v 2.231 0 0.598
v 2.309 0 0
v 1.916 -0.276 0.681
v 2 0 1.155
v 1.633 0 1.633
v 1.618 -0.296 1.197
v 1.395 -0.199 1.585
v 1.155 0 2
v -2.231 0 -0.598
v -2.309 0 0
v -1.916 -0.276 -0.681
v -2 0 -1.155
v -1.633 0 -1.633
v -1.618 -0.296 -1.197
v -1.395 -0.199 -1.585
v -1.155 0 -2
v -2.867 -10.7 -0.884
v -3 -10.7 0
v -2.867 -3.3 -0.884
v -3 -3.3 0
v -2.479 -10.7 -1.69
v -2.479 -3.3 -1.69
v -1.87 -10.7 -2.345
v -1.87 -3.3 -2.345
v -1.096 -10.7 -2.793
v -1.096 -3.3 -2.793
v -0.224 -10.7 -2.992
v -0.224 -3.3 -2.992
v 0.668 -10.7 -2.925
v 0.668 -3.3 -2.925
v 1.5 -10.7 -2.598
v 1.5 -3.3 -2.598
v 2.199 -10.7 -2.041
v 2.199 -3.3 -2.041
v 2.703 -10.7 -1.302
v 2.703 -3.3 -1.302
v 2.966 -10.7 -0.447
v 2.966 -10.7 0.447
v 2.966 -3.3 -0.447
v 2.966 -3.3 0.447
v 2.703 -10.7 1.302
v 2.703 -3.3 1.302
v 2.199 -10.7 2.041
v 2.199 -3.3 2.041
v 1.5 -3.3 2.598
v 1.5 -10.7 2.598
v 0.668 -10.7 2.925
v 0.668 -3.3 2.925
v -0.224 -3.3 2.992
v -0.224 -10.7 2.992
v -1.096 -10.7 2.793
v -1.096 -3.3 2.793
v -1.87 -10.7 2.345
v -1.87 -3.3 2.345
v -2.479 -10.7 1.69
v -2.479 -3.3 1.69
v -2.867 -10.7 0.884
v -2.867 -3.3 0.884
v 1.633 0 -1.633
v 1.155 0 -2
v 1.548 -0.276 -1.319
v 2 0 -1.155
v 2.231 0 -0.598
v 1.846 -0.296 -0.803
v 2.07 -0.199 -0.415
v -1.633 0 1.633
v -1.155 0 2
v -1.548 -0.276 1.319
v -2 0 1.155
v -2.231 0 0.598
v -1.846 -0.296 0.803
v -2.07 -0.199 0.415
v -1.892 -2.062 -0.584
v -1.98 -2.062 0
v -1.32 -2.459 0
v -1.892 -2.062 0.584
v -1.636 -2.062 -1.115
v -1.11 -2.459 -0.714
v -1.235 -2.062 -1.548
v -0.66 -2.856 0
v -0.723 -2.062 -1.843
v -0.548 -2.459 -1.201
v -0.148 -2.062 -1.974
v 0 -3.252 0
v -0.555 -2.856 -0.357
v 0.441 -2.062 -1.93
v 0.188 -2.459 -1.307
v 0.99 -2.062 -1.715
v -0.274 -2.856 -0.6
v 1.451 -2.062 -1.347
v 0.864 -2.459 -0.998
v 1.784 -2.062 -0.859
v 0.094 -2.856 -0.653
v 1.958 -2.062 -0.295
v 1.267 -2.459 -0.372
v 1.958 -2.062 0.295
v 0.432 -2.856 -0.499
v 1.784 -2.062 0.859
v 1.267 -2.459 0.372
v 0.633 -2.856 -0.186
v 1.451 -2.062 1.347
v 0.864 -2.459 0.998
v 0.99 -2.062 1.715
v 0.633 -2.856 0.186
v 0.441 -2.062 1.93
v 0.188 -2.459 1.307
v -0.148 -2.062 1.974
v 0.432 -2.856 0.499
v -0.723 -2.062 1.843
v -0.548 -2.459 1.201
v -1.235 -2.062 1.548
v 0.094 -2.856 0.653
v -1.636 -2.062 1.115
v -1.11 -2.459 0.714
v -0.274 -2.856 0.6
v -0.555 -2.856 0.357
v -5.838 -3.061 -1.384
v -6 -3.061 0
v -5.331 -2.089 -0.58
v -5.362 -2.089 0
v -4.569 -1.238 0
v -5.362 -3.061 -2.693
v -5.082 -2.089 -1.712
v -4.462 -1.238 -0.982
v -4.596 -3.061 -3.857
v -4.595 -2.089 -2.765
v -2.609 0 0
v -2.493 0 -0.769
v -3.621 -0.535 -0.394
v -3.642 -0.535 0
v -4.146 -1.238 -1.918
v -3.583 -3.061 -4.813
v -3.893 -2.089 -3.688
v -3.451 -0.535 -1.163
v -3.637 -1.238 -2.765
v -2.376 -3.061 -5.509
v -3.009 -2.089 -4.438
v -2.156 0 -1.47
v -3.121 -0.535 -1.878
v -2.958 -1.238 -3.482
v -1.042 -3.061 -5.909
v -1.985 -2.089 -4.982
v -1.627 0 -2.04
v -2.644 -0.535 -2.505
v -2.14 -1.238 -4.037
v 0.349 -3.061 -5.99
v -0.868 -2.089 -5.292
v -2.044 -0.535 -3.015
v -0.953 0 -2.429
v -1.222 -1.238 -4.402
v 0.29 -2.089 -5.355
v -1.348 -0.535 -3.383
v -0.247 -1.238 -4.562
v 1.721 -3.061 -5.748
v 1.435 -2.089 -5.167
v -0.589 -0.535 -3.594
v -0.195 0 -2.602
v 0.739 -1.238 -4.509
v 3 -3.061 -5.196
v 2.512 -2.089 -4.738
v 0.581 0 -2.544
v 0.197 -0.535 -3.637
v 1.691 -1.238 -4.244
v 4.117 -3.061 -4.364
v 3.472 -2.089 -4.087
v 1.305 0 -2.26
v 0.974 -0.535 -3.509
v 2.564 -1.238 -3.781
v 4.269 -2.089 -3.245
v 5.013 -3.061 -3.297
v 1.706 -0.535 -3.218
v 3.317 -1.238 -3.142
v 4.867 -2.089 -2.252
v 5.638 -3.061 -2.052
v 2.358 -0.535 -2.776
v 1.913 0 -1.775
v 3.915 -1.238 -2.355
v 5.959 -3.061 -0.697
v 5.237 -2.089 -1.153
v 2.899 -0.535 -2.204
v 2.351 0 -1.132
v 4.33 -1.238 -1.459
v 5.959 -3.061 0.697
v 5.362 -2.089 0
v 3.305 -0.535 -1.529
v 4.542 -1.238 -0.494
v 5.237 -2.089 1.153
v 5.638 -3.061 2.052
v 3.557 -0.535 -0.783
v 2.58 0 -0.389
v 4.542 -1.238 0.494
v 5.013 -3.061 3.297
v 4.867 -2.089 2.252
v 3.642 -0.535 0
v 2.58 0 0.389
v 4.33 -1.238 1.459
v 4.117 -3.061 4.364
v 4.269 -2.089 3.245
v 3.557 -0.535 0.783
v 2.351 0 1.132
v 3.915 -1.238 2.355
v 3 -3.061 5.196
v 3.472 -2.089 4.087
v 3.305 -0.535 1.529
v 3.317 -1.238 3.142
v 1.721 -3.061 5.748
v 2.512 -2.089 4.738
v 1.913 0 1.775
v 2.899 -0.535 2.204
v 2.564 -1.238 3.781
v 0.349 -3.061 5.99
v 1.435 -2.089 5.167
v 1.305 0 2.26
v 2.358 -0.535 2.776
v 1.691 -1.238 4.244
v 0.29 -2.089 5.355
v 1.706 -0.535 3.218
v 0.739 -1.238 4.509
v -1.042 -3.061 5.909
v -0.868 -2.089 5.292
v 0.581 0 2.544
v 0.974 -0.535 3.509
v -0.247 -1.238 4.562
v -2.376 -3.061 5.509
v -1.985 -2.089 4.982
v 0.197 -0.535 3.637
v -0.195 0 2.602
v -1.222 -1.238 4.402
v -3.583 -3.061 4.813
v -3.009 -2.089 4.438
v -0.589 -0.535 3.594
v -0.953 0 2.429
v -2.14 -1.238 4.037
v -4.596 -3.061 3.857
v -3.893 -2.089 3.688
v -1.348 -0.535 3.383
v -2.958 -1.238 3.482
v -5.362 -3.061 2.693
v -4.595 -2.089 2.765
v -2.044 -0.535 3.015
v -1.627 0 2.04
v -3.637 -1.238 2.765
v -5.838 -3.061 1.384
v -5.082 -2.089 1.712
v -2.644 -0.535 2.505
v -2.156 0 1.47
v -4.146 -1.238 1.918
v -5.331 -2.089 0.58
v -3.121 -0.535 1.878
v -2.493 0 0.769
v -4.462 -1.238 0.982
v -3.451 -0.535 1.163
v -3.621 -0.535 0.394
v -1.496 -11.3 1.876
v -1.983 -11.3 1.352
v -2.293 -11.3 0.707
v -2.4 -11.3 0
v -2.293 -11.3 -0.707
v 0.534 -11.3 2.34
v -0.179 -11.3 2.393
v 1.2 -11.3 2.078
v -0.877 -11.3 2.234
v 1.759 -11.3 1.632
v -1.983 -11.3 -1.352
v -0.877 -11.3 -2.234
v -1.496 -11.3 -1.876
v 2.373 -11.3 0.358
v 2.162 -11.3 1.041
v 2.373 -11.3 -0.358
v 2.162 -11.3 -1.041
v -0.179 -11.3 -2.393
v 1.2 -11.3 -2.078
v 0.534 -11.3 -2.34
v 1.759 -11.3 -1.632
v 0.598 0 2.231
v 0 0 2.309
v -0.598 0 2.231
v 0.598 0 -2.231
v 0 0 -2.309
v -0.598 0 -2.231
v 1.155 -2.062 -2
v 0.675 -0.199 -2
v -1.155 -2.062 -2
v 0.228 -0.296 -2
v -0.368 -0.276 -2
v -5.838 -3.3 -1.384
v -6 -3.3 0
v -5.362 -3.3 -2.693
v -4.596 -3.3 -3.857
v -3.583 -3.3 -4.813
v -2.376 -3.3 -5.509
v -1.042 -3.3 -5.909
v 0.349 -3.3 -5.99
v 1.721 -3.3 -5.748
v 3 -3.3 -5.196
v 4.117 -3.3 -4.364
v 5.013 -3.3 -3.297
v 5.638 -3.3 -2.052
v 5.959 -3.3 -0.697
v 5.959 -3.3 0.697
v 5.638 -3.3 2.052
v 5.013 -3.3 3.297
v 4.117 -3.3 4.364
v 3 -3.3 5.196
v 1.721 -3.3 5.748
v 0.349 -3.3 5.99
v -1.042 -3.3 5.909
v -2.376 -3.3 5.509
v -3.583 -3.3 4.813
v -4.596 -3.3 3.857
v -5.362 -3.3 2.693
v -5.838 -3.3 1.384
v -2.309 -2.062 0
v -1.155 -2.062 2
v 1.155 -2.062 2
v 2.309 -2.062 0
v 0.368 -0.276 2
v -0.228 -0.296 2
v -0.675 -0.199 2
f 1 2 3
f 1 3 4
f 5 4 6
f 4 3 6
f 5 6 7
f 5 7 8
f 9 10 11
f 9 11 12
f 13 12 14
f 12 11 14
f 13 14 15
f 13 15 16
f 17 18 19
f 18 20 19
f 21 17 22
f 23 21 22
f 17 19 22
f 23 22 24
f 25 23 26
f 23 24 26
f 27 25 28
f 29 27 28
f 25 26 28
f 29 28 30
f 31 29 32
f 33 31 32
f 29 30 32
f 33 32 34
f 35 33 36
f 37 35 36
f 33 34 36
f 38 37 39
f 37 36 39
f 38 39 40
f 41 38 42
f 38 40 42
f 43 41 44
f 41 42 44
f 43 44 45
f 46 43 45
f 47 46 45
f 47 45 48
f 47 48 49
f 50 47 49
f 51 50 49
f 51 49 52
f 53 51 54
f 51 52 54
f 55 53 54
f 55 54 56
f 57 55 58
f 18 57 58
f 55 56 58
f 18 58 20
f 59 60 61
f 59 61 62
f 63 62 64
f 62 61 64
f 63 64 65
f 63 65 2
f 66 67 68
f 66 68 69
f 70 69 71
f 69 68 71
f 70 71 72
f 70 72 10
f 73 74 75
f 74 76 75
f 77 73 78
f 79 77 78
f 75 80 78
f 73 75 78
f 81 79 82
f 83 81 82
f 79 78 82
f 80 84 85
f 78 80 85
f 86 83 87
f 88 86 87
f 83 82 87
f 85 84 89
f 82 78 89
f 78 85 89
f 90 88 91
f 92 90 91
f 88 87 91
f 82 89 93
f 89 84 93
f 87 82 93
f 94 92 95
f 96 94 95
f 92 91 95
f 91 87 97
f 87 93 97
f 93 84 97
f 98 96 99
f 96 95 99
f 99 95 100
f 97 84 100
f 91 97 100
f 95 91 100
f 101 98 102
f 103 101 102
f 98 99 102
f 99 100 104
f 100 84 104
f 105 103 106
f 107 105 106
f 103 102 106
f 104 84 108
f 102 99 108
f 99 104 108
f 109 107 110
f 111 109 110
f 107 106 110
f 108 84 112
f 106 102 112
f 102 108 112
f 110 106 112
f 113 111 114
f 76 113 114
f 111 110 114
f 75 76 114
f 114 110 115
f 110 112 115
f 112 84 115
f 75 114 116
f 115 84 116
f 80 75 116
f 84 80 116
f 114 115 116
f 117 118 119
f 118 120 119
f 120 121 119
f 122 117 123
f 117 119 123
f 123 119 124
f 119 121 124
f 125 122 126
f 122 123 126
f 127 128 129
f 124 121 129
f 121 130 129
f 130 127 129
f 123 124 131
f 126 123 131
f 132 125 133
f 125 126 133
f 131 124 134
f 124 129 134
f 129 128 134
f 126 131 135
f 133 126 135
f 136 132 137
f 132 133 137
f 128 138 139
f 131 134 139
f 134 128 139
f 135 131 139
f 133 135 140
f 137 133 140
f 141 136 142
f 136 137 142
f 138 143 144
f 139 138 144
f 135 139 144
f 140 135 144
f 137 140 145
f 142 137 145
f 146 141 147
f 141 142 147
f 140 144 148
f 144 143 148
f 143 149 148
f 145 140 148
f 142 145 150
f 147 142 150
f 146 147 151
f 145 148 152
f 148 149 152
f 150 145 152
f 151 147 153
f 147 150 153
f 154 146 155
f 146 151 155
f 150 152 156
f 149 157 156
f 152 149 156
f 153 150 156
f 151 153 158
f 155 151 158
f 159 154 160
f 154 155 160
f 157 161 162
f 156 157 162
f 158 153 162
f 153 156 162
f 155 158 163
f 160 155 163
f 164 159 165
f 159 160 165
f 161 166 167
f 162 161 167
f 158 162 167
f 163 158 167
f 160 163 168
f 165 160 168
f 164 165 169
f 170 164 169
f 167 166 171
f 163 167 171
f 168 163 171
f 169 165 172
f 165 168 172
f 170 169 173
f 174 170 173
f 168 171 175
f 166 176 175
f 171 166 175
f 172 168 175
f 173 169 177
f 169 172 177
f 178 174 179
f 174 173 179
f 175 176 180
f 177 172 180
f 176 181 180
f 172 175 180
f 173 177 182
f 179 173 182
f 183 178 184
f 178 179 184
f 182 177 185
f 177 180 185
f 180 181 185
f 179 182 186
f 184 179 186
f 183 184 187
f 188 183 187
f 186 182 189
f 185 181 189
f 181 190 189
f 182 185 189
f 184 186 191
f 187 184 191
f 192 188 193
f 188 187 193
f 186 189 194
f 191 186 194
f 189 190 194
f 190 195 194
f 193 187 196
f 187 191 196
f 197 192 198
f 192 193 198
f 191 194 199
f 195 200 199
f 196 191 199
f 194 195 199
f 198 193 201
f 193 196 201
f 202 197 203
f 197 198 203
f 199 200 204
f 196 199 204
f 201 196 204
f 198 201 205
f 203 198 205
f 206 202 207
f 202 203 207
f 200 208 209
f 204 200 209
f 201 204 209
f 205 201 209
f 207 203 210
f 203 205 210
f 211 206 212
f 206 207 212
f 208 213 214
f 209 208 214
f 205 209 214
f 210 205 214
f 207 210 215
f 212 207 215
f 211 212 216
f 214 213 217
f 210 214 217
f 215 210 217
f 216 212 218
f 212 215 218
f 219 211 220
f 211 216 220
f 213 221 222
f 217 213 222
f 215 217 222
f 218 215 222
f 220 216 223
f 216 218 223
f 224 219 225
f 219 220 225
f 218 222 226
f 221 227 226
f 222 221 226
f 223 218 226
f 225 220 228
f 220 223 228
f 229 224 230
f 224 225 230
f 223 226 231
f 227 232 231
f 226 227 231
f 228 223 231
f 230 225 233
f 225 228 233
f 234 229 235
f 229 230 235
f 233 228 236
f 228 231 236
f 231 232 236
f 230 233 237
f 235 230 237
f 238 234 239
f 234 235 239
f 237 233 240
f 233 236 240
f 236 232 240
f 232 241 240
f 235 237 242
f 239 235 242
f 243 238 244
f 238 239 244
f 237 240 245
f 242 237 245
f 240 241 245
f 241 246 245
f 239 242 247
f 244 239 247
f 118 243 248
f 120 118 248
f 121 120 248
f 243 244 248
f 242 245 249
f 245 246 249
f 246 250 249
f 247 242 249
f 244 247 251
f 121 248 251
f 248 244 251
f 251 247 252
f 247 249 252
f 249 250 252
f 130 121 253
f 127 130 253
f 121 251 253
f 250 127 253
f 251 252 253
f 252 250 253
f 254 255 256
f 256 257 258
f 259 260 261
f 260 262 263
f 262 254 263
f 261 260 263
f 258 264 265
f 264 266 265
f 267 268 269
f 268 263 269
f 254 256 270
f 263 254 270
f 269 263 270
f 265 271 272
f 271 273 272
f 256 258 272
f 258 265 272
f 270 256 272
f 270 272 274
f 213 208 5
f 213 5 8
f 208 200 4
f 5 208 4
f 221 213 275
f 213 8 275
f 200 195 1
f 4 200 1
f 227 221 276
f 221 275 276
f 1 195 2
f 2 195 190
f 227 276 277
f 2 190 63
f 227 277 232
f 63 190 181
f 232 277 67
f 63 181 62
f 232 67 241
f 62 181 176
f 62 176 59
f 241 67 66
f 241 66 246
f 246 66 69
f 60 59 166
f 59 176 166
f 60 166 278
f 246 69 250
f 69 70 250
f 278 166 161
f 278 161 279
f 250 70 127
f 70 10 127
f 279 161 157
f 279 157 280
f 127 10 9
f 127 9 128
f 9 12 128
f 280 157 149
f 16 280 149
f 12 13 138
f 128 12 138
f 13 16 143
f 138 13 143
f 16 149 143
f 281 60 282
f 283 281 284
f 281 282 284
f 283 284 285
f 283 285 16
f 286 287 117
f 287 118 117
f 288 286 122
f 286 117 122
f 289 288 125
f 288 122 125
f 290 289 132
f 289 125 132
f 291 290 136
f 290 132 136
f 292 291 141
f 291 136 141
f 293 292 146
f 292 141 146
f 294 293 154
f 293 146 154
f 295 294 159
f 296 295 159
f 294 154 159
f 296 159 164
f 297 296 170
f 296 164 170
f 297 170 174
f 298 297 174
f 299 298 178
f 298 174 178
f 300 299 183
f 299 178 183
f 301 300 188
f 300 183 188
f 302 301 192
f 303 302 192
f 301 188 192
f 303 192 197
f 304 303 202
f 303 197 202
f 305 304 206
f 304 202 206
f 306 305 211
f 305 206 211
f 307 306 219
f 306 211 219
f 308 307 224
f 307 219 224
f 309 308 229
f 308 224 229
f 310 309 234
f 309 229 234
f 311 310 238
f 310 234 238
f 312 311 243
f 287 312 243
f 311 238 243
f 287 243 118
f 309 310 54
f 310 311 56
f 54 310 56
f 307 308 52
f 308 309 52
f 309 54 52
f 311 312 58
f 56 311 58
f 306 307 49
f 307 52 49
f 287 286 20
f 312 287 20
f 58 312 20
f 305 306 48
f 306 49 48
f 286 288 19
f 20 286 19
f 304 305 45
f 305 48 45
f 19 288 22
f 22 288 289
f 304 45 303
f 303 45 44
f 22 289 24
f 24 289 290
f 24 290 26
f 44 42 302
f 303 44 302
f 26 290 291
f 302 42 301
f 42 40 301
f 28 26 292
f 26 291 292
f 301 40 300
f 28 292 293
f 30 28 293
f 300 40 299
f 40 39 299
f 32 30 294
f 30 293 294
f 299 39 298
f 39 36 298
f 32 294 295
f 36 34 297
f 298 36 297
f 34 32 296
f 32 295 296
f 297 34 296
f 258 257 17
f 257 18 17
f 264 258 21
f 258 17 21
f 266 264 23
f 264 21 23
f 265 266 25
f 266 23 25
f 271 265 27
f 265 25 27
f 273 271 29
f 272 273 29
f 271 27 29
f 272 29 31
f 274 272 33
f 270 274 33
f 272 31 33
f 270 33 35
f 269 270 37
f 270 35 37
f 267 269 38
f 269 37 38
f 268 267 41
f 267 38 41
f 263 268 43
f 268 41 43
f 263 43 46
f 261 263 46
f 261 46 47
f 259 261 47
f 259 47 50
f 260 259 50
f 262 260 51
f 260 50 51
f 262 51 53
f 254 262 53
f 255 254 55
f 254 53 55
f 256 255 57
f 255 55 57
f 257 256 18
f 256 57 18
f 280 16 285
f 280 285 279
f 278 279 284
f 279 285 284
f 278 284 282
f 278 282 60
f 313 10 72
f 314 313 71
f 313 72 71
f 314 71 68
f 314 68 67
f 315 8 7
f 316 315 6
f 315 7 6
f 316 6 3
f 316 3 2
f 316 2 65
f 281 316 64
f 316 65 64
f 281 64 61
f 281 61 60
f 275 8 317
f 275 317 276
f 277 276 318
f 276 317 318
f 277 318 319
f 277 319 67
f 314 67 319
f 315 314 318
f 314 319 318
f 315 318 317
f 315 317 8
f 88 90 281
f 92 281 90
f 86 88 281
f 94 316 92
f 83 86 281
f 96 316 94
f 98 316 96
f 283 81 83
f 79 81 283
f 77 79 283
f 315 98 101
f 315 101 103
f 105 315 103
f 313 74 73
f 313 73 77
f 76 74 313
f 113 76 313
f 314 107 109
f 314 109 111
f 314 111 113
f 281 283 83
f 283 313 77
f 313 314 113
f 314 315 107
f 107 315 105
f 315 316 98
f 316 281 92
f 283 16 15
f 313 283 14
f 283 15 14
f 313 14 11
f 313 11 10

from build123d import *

# Parameters (mm, degrees)
SCHNITT_LINEAR_AUSTRAGEN1_DEPTH = 2.0625


with BuildPart() as part:
    # Skizze1 → Rotation1 (revolve)
    with BuildSketch(Plane(origin=(0, 0, 0), x_dir=(1, 0, 0), z_dir=(0, 0, -1)), mode=Mode.PRIVATE) as rotation1_sk:
        with BuildLine():
            Line((0, 11.3), (2.4, 11.3))
            Line((2.4, 11.3), (3, 10.7))
            Line((3, 10.7), (3, 3.3))
            Line((3, 3.3), (6, 3.3))
            Line((6, 3.3), (6, 3.06135))
            ThreePointArc((6, 3.06135), (4.568743009, 1.238234699), (2.609401077, 0))
            Line((2.609401077, 0), (2.309401077, 0))
            Line((2.309401077, 0), (1.98, 0.329401077))
            Line((1.98, 0.329401077), (1.98, 2.0625))
            Line((1.98, 2.0625), (0, 3.252204026))
            Line((0, 3.252204026), (0, 11.3))
        make_face()
    revolve(rotation1_sk.sketch.rotate(Axis((0, 0, 0), (0, -1, 0)), 180), axis=Axis((0, 0, 0), (0, -1, 0)))  # turned: the seam where the file's is

    # Skizze2 → Schnitt-Linear austragen1 (cut)
    with BuildSketch(Plane(origin=(1.973616694, 0, -1.468825329), x_dir=(-1, 0, 0), z_dir=(0, 1, 0))):
        Polygon((0.818916155, -0.531174671), (3.128317232, -0.531174671), (4.28301777, 1.468825329), (3.128317232, 3.468825329), (0.818916155, 3.468825329), (-0.335784383, 1.468825329), align=None)
    extrude(amount=-SCHNITT_LINEAR_AUSTRAGEN1_DEPTH, mode=Mode.SUBTRACT)


solid = part.part
